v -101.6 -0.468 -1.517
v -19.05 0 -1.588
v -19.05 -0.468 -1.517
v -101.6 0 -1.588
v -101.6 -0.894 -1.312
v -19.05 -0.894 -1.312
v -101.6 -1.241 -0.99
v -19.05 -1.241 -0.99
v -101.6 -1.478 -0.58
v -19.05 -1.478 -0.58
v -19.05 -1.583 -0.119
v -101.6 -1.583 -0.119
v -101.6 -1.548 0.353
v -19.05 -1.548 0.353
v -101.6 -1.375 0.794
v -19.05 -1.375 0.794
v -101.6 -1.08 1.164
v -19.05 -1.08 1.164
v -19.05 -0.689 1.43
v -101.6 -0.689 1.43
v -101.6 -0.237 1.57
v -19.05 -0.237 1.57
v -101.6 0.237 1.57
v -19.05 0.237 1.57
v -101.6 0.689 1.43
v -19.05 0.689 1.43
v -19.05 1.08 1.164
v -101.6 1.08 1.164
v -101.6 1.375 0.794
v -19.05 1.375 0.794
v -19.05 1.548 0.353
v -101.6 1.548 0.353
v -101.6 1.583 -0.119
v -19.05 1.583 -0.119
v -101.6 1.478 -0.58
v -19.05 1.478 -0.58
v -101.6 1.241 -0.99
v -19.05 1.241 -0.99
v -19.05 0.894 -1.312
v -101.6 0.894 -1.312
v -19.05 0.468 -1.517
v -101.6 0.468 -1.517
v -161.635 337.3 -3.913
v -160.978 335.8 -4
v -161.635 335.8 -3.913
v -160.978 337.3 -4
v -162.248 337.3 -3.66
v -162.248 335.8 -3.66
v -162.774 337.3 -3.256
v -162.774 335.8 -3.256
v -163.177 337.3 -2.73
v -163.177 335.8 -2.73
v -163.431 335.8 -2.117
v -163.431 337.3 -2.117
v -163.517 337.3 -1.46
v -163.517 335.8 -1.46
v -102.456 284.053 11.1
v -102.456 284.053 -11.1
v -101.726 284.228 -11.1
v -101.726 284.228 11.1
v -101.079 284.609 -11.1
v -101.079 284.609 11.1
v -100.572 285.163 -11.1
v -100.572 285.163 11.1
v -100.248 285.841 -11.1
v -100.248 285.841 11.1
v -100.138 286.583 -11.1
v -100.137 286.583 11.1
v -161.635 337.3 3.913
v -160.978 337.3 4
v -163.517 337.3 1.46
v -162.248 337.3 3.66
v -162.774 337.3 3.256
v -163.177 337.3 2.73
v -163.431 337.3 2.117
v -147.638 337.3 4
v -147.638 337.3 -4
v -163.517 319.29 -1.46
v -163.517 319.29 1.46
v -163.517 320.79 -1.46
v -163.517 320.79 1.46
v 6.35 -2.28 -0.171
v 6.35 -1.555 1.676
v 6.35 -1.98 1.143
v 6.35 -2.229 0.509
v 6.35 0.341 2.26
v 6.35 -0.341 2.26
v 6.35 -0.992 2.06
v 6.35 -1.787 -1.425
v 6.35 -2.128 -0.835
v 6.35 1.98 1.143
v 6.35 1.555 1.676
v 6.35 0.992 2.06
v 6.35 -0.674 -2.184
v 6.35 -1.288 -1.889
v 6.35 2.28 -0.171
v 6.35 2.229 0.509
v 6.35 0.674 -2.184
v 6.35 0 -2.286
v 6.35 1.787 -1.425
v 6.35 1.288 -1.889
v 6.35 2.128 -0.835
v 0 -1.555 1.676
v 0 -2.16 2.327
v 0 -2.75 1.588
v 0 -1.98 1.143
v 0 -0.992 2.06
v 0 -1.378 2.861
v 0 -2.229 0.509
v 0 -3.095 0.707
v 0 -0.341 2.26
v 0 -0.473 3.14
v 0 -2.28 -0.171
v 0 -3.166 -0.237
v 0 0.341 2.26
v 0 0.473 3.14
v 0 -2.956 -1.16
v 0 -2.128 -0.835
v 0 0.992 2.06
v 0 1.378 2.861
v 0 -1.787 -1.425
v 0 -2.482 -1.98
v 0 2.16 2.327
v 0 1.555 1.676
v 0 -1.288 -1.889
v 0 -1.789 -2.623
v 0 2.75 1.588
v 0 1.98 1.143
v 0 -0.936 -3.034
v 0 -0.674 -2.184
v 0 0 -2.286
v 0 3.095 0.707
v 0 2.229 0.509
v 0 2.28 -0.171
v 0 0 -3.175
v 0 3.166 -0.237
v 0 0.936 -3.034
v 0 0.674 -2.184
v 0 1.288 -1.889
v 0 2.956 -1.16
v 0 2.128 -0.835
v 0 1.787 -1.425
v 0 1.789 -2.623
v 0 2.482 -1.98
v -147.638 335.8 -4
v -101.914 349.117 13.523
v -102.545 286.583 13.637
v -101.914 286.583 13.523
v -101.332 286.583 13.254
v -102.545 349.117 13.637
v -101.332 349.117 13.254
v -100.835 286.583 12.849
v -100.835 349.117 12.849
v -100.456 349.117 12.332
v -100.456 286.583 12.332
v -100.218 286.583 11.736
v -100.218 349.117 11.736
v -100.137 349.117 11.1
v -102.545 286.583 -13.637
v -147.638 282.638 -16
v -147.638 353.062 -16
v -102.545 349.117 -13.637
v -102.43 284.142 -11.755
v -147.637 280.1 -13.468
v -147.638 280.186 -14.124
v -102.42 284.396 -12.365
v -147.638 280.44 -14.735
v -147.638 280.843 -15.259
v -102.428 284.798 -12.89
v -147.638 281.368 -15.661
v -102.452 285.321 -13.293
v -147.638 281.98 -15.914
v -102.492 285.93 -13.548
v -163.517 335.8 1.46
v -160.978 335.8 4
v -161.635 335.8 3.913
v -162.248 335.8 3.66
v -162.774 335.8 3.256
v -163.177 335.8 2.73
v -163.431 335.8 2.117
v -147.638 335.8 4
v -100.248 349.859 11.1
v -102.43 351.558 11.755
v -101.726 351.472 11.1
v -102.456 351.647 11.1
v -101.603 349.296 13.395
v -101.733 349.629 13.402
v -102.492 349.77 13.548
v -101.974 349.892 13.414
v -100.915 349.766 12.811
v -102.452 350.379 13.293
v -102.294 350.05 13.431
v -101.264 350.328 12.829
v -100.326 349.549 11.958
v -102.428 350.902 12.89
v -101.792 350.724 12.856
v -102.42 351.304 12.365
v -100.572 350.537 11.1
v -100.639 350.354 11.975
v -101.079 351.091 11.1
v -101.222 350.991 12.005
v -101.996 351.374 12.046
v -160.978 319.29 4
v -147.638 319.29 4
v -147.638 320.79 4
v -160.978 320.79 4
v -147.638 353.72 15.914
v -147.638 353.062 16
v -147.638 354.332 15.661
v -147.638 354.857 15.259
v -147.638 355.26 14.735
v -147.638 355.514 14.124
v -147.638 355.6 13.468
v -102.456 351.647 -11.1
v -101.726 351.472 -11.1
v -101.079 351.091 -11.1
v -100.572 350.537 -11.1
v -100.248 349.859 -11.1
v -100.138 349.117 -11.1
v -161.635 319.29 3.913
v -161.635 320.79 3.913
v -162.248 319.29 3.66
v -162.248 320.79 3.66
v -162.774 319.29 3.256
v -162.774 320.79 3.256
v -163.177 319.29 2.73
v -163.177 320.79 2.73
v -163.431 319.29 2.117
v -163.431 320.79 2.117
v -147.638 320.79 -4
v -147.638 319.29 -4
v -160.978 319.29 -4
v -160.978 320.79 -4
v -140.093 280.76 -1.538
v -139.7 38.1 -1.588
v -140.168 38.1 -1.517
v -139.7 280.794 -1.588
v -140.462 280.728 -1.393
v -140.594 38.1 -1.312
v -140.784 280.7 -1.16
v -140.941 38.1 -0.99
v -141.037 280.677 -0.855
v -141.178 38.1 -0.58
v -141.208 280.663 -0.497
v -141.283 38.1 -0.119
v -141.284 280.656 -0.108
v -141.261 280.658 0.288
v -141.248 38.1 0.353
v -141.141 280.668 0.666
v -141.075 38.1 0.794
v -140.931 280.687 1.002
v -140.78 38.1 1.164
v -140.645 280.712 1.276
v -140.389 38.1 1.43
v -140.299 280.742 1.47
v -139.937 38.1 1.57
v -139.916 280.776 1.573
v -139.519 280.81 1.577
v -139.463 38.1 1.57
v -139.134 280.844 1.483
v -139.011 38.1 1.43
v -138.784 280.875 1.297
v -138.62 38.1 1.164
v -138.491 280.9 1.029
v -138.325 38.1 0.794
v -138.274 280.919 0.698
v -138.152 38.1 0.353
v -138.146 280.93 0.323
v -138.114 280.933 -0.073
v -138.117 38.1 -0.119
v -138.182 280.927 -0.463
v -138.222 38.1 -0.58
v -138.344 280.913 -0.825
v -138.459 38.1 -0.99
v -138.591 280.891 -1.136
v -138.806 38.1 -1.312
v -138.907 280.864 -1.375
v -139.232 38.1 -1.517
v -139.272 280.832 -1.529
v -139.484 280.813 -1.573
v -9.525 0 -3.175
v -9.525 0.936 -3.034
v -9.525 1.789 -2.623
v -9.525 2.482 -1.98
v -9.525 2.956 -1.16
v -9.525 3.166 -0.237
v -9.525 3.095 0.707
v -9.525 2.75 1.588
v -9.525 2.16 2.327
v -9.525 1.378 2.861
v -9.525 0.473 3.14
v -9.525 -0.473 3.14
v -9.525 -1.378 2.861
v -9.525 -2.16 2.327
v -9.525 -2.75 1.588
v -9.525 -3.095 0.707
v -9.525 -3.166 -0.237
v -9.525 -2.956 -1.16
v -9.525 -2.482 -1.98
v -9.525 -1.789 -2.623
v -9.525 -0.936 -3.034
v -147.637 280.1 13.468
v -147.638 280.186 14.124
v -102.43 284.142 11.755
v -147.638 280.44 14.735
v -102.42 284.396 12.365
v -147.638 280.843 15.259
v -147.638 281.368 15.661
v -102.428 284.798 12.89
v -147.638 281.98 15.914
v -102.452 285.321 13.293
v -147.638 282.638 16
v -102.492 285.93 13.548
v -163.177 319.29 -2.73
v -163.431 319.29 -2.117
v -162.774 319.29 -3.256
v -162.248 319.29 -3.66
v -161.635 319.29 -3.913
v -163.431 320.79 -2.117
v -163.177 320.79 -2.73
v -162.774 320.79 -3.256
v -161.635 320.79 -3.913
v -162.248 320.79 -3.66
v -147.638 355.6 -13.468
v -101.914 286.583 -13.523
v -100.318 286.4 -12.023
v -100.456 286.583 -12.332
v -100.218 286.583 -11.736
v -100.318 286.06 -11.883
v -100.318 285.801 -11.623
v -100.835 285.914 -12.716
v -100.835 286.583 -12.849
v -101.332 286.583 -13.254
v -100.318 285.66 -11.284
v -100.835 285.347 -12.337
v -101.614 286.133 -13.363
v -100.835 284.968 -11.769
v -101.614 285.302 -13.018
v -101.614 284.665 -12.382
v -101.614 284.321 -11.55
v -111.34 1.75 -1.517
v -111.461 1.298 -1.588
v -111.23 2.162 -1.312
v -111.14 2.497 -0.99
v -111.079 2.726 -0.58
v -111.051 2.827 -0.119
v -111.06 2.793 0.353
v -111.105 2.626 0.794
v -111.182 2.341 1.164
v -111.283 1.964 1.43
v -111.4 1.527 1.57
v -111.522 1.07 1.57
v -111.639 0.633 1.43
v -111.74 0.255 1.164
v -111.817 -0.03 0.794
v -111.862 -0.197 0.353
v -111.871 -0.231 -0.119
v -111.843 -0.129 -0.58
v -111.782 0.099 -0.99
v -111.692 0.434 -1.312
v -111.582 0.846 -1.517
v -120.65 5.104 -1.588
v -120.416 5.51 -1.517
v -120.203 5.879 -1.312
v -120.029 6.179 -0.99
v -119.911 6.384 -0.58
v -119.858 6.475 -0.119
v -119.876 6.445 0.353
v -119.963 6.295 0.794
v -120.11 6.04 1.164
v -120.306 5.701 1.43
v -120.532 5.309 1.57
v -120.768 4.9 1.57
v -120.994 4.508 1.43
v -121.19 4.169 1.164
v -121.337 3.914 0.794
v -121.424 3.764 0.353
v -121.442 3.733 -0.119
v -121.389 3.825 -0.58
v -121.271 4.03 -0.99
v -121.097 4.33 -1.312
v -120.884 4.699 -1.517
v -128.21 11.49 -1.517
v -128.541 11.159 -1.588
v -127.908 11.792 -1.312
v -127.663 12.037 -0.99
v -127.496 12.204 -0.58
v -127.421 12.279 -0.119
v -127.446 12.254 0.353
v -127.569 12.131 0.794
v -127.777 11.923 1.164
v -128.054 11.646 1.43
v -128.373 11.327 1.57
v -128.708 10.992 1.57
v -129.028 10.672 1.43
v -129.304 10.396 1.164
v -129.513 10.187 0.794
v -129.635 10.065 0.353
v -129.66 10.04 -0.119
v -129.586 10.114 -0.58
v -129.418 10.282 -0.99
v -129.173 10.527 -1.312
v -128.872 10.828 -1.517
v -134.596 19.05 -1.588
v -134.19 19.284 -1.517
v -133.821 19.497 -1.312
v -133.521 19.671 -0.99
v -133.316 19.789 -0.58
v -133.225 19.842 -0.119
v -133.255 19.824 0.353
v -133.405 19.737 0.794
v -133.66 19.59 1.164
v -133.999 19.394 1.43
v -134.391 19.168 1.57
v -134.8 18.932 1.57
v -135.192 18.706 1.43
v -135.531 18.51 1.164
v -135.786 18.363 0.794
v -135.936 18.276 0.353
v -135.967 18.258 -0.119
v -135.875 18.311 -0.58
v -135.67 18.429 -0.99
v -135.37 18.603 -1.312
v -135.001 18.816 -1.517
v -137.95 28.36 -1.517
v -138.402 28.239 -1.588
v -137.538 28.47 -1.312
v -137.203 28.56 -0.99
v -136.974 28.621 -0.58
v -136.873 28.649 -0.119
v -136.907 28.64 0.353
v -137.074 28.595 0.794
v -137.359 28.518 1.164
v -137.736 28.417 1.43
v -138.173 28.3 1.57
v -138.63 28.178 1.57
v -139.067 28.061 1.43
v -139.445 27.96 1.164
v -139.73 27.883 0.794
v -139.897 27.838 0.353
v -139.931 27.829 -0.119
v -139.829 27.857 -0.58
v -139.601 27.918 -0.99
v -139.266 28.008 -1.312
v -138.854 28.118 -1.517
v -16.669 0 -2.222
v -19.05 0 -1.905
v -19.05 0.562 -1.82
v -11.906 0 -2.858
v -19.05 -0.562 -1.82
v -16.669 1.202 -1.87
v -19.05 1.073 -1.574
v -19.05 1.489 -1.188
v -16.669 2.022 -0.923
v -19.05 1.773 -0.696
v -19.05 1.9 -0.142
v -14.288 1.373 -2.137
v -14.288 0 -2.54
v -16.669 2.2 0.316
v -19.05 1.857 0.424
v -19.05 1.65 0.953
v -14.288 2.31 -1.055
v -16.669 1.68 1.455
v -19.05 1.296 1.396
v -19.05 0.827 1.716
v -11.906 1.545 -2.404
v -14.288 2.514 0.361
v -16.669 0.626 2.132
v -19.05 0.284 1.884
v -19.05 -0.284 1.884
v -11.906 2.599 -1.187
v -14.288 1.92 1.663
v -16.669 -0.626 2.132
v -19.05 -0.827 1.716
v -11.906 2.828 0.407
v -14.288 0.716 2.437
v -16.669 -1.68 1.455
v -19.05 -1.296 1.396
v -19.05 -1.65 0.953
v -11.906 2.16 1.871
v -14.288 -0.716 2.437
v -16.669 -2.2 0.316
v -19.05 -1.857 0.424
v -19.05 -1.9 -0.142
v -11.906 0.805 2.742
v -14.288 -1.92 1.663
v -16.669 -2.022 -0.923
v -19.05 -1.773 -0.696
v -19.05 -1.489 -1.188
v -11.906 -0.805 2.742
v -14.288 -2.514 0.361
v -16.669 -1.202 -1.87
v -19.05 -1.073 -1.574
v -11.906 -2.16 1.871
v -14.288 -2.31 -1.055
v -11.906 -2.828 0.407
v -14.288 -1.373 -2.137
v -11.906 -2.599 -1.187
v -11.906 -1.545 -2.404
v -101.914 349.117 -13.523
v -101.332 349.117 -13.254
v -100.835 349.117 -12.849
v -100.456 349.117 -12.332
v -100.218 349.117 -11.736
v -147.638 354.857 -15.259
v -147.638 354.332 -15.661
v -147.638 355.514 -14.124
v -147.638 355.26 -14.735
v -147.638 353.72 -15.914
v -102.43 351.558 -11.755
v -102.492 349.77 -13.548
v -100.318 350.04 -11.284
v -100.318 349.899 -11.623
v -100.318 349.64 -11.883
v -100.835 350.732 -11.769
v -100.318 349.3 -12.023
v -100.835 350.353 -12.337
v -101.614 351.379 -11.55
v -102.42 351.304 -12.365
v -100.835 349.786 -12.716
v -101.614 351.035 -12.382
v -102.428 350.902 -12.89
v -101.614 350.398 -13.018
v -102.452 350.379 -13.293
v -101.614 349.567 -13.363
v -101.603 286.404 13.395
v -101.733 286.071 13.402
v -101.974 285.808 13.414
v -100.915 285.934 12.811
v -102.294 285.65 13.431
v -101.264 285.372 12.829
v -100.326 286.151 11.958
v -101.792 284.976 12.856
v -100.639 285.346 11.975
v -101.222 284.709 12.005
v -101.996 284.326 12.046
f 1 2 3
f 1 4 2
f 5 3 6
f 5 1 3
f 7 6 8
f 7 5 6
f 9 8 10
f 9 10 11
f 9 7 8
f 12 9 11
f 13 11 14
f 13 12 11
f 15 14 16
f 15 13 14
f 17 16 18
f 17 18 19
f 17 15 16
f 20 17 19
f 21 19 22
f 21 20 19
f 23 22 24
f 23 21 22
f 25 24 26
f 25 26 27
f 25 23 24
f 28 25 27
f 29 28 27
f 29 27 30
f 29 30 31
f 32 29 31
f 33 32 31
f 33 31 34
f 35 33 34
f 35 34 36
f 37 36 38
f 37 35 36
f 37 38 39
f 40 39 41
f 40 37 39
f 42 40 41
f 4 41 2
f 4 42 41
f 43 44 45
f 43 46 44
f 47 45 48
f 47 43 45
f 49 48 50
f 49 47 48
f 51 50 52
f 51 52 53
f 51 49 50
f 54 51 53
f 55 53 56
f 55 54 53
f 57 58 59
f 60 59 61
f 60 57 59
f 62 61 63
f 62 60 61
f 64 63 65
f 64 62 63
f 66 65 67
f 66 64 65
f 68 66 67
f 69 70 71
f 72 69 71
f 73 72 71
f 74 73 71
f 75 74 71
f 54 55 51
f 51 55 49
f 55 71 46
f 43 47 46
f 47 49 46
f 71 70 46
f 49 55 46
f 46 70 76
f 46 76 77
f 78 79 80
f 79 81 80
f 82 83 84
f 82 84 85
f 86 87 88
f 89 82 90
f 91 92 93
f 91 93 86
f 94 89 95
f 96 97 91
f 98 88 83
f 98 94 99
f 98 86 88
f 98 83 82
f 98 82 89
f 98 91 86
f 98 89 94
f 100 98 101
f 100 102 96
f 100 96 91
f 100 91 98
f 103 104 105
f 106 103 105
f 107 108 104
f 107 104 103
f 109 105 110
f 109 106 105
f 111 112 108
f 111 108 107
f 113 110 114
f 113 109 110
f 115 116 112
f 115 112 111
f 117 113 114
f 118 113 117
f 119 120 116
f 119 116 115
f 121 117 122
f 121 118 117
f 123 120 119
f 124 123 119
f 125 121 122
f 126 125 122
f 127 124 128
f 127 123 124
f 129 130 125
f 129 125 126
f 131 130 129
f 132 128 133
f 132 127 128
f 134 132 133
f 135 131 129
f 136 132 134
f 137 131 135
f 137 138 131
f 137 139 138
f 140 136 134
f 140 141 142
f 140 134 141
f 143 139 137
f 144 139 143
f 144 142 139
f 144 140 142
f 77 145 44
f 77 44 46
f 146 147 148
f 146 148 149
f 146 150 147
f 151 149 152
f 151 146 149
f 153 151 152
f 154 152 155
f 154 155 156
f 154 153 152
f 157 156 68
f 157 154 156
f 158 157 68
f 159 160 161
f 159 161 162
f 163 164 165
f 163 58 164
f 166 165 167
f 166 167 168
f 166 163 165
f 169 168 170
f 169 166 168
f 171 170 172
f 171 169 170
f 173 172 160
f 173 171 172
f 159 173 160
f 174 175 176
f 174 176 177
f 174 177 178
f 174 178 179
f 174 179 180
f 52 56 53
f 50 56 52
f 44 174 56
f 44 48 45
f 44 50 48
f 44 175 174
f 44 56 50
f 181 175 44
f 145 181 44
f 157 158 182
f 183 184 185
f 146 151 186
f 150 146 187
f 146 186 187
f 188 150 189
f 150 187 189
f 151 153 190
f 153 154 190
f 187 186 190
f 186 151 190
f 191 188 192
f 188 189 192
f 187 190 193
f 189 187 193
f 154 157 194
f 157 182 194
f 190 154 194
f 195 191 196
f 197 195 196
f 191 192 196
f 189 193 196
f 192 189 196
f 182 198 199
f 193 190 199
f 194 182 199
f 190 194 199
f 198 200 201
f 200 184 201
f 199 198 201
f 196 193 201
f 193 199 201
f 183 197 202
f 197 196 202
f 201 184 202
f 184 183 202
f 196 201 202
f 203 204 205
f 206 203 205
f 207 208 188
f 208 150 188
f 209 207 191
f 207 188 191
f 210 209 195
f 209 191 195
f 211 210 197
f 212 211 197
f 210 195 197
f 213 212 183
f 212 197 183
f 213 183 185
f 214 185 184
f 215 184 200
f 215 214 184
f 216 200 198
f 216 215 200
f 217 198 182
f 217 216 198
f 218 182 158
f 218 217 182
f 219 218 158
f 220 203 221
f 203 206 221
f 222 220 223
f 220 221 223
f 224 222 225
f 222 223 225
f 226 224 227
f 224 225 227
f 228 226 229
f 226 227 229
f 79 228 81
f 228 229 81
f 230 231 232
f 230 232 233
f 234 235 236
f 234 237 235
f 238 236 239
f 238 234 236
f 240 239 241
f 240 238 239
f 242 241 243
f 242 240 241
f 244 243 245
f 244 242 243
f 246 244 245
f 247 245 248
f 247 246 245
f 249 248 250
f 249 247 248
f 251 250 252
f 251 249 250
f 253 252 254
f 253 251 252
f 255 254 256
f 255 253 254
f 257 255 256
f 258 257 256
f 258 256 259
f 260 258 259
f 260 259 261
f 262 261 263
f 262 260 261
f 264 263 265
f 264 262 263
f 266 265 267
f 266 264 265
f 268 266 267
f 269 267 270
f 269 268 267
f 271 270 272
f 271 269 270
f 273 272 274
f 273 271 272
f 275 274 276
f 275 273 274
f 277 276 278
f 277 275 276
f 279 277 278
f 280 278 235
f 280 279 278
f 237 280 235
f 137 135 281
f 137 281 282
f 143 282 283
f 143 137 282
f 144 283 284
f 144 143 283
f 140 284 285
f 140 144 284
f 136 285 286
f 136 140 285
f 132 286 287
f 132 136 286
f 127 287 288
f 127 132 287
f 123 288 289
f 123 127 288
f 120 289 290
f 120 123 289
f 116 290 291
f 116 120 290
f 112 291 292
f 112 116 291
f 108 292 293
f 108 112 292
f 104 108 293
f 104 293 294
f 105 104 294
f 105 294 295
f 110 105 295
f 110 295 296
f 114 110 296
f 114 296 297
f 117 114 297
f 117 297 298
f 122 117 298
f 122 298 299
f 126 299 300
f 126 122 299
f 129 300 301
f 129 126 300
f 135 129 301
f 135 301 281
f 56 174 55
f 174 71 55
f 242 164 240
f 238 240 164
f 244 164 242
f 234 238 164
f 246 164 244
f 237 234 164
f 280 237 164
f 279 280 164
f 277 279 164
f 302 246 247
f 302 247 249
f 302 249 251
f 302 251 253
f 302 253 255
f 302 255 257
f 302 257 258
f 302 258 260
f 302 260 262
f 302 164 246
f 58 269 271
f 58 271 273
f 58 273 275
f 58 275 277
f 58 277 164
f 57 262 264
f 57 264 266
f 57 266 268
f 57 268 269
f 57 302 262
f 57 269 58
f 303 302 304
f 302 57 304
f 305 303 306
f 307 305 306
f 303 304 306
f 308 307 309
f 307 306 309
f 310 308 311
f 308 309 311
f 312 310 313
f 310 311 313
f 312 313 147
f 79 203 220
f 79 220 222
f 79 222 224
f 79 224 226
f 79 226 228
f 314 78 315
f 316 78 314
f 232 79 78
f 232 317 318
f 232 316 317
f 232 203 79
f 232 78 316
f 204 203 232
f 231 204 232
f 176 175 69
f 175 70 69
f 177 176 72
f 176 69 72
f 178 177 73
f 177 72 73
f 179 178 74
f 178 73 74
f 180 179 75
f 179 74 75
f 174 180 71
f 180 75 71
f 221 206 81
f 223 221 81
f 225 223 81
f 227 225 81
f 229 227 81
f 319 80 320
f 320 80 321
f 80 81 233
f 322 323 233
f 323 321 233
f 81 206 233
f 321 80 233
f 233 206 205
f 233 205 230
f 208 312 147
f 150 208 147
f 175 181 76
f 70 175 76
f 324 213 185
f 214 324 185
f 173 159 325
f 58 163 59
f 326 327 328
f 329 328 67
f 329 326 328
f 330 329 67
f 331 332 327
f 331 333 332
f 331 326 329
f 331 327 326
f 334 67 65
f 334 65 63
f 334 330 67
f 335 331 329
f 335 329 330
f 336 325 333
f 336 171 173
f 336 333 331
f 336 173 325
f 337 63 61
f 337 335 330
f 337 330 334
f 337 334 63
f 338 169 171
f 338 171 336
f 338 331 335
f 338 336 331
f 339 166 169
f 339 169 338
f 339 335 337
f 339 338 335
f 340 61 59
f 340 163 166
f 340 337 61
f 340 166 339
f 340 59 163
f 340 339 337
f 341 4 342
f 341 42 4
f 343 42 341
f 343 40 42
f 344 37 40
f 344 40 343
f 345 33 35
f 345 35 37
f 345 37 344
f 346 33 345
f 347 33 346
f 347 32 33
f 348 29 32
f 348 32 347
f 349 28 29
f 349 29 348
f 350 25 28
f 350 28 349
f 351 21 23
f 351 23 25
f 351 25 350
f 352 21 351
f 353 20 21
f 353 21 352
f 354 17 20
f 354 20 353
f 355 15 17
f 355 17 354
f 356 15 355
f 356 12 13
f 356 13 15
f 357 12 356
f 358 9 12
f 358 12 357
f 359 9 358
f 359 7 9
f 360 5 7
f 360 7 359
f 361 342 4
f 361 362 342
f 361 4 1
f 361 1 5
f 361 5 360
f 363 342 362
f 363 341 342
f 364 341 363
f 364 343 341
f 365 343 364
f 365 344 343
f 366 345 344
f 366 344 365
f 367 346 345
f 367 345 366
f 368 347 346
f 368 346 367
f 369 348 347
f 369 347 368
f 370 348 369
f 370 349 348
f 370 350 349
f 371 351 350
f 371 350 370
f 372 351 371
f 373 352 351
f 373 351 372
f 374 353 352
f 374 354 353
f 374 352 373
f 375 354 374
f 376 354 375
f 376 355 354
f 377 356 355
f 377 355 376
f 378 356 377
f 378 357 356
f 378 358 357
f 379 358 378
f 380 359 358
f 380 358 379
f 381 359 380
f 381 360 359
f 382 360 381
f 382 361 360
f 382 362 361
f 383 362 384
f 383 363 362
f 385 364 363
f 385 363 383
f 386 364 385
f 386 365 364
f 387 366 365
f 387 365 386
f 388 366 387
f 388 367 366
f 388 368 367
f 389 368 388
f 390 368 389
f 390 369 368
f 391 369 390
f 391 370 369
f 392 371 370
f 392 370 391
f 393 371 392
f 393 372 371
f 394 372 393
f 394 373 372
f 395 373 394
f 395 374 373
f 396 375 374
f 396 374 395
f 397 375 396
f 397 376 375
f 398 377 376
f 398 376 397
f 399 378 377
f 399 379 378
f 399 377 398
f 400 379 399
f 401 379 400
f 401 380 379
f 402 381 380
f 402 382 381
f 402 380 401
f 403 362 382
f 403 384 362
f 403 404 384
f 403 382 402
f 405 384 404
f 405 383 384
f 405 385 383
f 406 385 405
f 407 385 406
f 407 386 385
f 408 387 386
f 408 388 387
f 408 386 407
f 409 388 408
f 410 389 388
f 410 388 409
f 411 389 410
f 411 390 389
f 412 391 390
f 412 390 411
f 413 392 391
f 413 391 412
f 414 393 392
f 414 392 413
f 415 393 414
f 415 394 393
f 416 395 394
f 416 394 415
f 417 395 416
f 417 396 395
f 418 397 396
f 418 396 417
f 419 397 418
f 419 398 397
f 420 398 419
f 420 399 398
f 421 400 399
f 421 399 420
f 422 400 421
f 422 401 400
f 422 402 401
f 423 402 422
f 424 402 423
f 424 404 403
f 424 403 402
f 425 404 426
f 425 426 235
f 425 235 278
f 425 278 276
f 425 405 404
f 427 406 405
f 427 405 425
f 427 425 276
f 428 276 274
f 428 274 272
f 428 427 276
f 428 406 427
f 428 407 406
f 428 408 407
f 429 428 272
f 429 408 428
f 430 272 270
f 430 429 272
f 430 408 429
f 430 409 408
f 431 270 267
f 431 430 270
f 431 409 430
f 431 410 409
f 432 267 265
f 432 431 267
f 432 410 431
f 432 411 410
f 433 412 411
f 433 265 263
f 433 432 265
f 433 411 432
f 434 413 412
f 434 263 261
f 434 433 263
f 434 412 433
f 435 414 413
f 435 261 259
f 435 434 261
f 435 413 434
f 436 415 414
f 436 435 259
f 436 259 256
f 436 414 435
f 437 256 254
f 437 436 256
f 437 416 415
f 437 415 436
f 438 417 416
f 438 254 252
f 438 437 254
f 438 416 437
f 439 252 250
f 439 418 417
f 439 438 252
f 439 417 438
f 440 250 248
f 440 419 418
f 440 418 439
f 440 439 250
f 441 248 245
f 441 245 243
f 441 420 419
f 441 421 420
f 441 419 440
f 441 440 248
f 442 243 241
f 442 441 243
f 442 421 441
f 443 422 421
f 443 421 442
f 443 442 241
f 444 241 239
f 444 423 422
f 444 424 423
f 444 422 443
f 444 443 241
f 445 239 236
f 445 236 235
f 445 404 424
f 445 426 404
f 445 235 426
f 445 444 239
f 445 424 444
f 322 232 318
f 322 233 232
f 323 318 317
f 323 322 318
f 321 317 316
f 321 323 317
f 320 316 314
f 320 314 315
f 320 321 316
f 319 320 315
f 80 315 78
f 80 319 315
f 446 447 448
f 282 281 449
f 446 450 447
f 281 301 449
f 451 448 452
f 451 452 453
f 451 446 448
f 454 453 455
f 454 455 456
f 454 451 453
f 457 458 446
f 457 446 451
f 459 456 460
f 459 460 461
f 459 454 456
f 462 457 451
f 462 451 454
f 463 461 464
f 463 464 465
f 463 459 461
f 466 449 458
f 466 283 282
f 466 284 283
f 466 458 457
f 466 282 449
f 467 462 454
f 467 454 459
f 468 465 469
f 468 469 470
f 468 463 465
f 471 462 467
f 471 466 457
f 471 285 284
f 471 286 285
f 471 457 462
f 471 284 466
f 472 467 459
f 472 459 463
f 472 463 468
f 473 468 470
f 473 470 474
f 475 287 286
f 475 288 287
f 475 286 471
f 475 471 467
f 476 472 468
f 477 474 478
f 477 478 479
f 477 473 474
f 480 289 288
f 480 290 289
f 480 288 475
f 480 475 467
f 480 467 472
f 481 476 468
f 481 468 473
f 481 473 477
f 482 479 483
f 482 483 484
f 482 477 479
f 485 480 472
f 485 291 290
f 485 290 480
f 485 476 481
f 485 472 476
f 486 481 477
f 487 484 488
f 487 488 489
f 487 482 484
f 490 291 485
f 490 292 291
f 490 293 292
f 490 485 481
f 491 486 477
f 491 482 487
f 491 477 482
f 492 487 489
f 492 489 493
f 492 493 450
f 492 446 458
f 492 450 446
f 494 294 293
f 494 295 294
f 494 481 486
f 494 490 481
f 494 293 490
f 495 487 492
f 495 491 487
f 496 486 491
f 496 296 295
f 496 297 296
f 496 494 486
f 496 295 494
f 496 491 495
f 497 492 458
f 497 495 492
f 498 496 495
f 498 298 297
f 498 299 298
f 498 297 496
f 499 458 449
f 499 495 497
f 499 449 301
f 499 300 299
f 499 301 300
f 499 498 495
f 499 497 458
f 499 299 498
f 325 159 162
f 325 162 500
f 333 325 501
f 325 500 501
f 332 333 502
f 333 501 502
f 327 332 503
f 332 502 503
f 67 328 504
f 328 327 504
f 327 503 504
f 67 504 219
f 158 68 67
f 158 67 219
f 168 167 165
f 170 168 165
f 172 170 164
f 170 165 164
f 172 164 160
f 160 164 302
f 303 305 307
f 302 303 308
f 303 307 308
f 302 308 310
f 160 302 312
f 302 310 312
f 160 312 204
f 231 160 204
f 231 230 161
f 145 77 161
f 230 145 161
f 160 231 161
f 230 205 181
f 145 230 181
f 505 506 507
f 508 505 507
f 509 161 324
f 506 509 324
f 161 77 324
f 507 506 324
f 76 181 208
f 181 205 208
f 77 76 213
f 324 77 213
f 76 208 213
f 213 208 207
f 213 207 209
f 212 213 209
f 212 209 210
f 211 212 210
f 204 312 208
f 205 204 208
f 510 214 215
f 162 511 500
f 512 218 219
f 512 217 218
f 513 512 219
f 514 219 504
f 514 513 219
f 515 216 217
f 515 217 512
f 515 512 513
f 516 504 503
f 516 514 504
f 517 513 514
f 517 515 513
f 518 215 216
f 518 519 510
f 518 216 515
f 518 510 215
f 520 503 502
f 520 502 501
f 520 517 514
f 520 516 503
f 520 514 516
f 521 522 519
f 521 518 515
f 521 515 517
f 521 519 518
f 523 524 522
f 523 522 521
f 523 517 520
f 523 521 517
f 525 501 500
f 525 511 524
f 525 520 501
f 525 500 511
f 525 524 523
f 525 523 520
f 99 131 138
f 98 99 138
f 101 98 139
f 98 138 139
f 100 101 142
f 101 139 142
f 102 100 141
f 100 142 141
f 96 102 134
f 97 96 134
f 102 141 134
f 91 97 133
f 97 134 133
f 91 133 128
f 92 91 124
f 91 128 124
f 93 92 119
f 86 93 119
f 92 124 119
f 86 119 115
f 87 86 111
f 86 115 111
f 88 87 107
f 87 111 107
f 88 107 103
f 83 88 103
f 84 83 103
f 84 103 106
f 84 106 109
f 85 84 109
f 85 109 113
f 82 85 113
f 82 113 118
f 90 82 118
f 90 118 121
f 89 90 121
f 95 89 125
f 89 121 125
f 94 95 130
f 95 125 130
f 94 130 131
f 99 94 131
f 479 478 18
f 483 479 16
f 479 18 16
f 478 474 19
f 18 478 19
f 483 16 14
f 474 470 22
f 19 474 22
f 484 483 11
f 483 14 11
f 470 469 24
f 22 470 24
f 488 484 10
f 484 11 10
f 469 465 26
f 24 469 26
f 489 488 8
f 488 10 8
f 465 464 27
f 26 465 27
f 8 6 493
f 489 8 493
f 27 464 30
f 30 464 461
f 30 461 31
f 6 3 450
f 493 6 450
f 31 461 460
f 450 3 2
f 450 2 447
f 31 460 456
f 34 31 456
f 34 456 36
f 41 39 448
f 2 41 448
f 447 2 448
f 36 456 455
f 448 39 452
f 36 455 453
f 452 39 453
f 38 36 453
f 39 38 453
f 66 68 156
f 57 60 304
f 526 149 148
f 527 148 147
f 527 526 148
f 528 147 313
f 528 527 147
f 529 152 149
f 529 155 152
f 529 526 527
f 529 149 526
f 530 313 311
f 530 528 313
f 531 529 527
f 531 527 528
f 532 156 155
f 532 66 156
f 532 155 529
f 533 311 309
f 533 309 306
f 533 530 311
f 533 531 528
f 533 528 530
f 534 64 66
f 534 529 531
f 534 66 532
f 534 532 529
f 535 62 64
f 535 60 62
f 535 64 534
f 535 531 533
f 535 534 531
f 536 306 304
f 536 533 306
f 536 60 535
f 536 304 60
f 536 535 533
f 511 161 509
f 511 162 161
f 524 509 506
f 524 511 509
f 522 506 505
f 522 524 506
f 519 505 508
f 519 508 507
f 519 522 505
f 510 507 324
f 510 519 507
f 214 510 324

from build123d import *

# Parameters (mm, degrees)
SKETCH2_R           = 1.5875
SKETCH3_R           = 3.175
BOSS_EXTRUDE1_DEPTH = 19.05
SKETCH4_R           = 2.286
BOSS_EXTRUDE2_DEPTH = 6.35
CHAMFER1_SIZE       = 1.27
CHAMFER1_SIZE2      = 9.525
SKETCH5_W           = 47.5
SKETCH5_H           = 75.5
BOSS_EXTRUDE3_DEPTH = 16
SKETCH6_W           = 8
SKETCH6_H           = 1.5
BOSS_EXTRUDE4_DEPTH = 15.88
DRAFT1_ANGLE        = -5
DRAFT2_ANGLE        = -3
FILLET1_R           = 2.54
FILLET2_R           = 2.54


with BuildPart() as part:
    # Sweep1: sweep along a path in Sketch1
    with BuildLine(Plane.XY) as sweep1_path:
        Line((0, 0), (-101.6, 0))
        ThreePointArc((-101.6, 0), (-128.540768363, 11.159231637), (-139.7, 38.1))
        Line((-139.7, 38.1), (-139.7, 355.6))
    # Sketch2 → Sweep1 (sweep)
    with BuildSketch(Plane(origin=(0, 0, 0), x_dir=(0, 0, -1), z_dir=(1, 0, 0))):
        Circle(SKETCH2_R)
    sweep(path=sweep1_path.line)

    # Sketch3 → Boss-Extrude1 (add)
    with BuildSketch(Plane(origin=(0, 0, 0), x_dir=(0, 0, -1), z_dir=(1, 0, 0))):
        Circle(SKETCH3_R)
    extrude(amount=-BOSS_EXTRUDE1_DEPTH)

    # Sketch4 → Boss-Extrude2 (add)
    with BuildSketch(Plane(origin=(0, 0, 0), x_dir=(0, 0, -1), z_dir=(1, 0, 0))):
        Circle(SKETCH4_R)
    extrude(amount=BOSS_EXTRUDE2_DEPTH)

    # Chamfer1
    chamfer1_edges = [part.edges().sort_by_distance(p)[0] for p in [
        (-19.05, 0, 3.175),
    ]]
    chamfer1_side = [part.faces().sort_by_distance(p)[0] for p in [
        (-19.05, 0, 3.085197439),
    ]]
    chamfer(chamfer1_edges, length=CHAMFER1_SIZE, length2=CHAMFER1_SIZE2, reference=chamfer1_side[0])

    # Sketch5 → Boss-Extrude3 (add, symmetric)
    with BuildSketch(Plane.XY):
        with Locations((-123.8875, 317.85)):
            Rectangle(SKETCH5_W, SKETCH5_H)
    extrude(amount=BOSS_EXTRUDE3_DEPTH, both=True)

    # Sketch6 → Boss-Extrude4 (add)
    with BuildSketch(Plane(origin=(-147.6375, 0, 0), x_dir=(0, 0, -1), z_dir=(1, 0, 0))):
        with Locations((0, 336.55)):
            Rectangle(SKETCH6_W, SKETCH6_H)
        with Locations((0, 320.04)):
            Rectangle(SKETCH6_W, SKETCH6_H)
    extrude(amount=-BOSS_EXTRUDE4_DEPTH)

    # Draft1
    draft1_faces = [part.faces().sort_by_distance(p)[0] for p in [
        (-123.804705338, 280.1, 0),
        (-123.8875, 355.6, 0),
    ]]
    draft(draft1_faces, Plane(origin=(-147.6375, 355.6, 16), x_dir=(0, 0, -1), z_dir=(-1, 0, 0)), DRAFT1_ANGLE)

    # Draft2
    draft2_faces = [part.faces().sort_by_distance(p)[0] for p in [
        (-124.348635482, 317.85, -16),
        (-124.348635482, 317.85, 16),
    ]]
    draft(draft2_faces, Plane(origin=(-147.6375, 355.6, 16), x_dir=(0, 0, -1), z_dir=(-1, 0, 0)), DRAFT2_ANGLE)

    # Fillet1
    fillet1_edges = [part.edges().sort_by_distance(p)[0] for p in [
        (-123.8875, 353.522144241, -14.755315242),
        (-100.1375, 351.444288483, 0),
        (-123.8875, 282.177855759, -14.755315242),
        (-100.1375, 317.85, -13.510630484),
        (-100.1375, 284.255711517, 0),
        (-100.1375, 317.85, 13.510630484),
        (-123.8875, 353.522144241, 14.755315242),
        (-123.8875, 282.177855759, 14.755315242),
    ]]
    fillet(fillet1_edges, radius=FILLET1_R)

    # Fillet2
    fillet2_edges = [part.edges().sort_by_distance(p)[0] for p in [
        (-163.5175, 336.55, -4),
        (-163.5175, 336.55, 4),
        (-163.5175, 320.04, -4),
        (-163.5175, 320.04, 4),
    ]]
    fillet(fillet2_edges, radius=FILLET2_R)


solid = part.part
